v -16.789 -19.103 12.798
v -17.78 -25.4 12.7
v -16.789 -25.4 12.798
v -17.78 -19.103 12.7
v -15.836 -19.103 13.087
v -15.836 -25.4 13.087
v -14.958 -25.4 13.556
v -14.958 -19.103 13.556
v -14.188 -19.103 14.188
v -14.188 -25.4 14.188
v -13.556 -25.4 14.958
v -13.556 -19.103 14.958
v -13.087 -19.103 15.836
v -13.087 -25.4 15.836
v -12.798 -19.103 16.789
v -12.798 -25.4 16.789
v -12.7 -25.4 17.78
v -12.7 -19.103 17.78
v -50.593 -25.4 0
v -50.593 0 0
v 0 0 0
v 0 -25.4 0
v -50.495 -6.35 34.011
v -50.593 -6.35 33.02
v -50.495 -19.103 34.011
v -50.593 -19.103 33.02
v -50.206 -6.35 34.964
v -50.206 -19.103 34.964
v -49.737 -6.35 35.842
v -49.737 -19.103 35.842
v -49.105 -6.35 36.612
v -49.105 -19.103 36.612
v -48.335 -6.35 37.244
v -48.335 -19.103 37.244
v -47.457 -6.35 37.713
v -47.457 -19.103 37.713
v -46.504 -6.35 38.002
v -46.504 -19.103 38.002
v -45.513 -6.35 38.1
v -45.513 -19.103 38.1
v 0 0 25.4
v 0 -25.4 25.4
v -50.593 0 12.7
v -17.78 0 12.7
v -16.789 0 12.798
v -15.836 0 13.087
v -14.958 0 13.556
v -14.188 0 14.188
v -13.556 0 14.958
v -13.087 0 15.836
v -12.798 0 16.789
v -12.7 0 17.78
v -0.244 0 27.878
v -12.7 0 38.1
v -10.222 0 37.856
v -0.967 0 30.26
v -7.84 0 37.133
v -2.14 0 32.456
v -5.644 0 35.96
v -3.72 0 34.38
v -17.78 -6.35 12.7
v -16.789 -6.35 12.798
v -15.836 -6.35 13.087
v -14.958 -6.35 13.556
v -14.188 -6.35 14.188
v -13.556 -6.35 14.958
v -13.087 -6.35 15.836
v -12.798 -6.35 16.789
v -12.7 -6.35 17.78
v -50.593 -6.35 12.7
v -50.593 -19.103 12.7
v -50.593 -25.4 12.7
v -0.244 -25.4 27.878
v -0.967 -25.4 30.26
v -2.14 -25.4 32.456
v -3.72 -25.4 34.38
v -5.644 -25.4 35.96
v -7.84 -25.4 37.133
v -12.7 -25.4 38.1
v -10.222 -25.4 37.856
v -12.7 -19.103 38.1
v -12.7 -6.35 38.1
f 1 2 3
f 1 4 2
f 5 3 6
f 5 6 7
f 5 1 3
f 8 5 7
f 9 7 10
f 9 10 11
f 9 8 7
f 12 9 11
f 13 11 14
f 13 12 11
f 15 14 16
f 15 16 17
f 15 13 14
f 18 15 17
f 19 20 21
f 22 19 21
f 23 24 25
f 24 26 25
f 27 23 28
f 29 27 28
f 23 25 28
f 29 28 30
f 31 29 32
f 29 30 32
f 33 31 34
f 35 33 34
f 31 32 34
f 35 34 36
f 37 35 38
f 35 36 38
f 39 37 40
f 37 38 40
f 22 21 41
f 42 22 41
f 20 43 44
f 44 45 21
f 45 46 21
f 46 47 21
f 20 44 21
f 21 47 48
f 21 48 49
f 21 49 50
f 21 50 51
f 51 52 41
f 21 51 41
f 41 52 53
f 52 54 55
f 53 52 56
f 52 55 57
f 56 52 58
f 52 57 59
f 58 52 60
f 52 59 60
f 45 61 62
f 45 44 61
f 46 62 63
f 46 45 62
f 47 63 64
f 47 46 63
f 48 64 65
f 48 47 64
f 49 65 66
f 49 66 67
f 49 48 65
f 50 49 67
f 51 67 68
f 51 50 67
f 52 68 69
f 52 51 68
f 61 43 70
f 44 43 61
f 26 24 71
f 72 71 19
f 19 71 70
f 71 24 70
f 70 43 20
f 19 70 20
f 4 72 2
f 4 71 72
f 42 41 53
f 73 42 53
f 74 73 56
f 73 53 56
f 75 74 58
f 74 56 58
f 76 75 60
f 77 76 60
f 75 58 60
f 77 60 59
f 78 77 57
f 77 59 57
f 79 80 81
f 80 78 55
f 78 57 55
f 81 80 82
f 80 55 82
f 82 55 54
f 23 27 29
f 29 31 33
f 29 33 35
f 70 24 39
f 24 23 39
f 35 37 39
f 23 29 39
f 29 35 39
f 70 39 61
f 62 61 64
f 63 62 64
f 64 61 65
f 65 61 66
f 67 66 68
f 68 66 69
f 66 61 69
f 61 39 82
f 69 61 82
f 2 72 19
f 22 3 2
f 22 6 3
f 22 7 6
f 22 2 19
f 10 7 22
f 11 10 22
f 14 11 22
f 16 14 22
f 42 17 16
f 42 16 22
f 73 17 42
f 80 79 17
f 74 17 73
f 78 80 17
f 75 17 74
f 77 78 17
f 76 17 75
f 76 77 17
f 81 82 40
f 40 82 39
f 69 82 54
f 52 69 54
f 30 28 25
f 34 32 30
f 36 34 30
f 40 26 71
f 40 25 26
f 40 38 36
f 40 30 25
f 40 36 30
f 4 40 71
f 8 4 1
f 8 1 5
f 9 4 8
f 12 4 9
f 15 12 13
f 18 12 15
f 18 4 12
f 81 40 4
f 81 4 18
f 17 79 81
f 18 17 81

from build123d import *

# Parameters (mm, degrees)
F1_DEPTH = 25.4
F2_W     = 37.8928769708
F2_H     = 6.35
F2_H_2   = 6.2968162
F3_DEPTH = 25.4
F4_R     = 5.08


with BuildPart() as f1:
    # F0 (on Front) → F1 (new body)
    with BuildSketch(Plane.XZ):
        with BuildLine():
            Line((-50.5928769708, 0), (0, 0))
            Line((0, 0), (0, 25.4))
            ThreePointArc((0, 25.4), (-3.7197438789, 34.3802561211), (-12.7, 38.1))
            Line((-12.7, 38.1), (-50.5928769708, 38.1))
            Line((-50.5928769708, 38.1), (-50.5928769708, 0))
        make_face()
    extrude(amount=F1_DEPTH)

    # F2 (on face) → F3 (cut)
    with BuildSketch(Plane.XY.offset(38.1)):
        with Locations((-31.6464384854, -3.175)):
            Rectangle(F2_W, F2_H)
        with Locations((-31.6464384854, -22.2515919)):
            Rectangle(F2_W, F2_H_2)
    extrude(amount=-F3_DEPTH, mode=Mode.SUBTRACT)

    # F4
    f4_edges = [f1.edges().sort_by_distance(p)[0] for p in [
        (-12.7, -22.251592, 12.7),
        (-12.7, -3.175, 12.7),
        (-50.592877, -12.726592, 38.1),
    ]]
    fillet(f4_edges, radius=F4_R)


solid = f1.part
